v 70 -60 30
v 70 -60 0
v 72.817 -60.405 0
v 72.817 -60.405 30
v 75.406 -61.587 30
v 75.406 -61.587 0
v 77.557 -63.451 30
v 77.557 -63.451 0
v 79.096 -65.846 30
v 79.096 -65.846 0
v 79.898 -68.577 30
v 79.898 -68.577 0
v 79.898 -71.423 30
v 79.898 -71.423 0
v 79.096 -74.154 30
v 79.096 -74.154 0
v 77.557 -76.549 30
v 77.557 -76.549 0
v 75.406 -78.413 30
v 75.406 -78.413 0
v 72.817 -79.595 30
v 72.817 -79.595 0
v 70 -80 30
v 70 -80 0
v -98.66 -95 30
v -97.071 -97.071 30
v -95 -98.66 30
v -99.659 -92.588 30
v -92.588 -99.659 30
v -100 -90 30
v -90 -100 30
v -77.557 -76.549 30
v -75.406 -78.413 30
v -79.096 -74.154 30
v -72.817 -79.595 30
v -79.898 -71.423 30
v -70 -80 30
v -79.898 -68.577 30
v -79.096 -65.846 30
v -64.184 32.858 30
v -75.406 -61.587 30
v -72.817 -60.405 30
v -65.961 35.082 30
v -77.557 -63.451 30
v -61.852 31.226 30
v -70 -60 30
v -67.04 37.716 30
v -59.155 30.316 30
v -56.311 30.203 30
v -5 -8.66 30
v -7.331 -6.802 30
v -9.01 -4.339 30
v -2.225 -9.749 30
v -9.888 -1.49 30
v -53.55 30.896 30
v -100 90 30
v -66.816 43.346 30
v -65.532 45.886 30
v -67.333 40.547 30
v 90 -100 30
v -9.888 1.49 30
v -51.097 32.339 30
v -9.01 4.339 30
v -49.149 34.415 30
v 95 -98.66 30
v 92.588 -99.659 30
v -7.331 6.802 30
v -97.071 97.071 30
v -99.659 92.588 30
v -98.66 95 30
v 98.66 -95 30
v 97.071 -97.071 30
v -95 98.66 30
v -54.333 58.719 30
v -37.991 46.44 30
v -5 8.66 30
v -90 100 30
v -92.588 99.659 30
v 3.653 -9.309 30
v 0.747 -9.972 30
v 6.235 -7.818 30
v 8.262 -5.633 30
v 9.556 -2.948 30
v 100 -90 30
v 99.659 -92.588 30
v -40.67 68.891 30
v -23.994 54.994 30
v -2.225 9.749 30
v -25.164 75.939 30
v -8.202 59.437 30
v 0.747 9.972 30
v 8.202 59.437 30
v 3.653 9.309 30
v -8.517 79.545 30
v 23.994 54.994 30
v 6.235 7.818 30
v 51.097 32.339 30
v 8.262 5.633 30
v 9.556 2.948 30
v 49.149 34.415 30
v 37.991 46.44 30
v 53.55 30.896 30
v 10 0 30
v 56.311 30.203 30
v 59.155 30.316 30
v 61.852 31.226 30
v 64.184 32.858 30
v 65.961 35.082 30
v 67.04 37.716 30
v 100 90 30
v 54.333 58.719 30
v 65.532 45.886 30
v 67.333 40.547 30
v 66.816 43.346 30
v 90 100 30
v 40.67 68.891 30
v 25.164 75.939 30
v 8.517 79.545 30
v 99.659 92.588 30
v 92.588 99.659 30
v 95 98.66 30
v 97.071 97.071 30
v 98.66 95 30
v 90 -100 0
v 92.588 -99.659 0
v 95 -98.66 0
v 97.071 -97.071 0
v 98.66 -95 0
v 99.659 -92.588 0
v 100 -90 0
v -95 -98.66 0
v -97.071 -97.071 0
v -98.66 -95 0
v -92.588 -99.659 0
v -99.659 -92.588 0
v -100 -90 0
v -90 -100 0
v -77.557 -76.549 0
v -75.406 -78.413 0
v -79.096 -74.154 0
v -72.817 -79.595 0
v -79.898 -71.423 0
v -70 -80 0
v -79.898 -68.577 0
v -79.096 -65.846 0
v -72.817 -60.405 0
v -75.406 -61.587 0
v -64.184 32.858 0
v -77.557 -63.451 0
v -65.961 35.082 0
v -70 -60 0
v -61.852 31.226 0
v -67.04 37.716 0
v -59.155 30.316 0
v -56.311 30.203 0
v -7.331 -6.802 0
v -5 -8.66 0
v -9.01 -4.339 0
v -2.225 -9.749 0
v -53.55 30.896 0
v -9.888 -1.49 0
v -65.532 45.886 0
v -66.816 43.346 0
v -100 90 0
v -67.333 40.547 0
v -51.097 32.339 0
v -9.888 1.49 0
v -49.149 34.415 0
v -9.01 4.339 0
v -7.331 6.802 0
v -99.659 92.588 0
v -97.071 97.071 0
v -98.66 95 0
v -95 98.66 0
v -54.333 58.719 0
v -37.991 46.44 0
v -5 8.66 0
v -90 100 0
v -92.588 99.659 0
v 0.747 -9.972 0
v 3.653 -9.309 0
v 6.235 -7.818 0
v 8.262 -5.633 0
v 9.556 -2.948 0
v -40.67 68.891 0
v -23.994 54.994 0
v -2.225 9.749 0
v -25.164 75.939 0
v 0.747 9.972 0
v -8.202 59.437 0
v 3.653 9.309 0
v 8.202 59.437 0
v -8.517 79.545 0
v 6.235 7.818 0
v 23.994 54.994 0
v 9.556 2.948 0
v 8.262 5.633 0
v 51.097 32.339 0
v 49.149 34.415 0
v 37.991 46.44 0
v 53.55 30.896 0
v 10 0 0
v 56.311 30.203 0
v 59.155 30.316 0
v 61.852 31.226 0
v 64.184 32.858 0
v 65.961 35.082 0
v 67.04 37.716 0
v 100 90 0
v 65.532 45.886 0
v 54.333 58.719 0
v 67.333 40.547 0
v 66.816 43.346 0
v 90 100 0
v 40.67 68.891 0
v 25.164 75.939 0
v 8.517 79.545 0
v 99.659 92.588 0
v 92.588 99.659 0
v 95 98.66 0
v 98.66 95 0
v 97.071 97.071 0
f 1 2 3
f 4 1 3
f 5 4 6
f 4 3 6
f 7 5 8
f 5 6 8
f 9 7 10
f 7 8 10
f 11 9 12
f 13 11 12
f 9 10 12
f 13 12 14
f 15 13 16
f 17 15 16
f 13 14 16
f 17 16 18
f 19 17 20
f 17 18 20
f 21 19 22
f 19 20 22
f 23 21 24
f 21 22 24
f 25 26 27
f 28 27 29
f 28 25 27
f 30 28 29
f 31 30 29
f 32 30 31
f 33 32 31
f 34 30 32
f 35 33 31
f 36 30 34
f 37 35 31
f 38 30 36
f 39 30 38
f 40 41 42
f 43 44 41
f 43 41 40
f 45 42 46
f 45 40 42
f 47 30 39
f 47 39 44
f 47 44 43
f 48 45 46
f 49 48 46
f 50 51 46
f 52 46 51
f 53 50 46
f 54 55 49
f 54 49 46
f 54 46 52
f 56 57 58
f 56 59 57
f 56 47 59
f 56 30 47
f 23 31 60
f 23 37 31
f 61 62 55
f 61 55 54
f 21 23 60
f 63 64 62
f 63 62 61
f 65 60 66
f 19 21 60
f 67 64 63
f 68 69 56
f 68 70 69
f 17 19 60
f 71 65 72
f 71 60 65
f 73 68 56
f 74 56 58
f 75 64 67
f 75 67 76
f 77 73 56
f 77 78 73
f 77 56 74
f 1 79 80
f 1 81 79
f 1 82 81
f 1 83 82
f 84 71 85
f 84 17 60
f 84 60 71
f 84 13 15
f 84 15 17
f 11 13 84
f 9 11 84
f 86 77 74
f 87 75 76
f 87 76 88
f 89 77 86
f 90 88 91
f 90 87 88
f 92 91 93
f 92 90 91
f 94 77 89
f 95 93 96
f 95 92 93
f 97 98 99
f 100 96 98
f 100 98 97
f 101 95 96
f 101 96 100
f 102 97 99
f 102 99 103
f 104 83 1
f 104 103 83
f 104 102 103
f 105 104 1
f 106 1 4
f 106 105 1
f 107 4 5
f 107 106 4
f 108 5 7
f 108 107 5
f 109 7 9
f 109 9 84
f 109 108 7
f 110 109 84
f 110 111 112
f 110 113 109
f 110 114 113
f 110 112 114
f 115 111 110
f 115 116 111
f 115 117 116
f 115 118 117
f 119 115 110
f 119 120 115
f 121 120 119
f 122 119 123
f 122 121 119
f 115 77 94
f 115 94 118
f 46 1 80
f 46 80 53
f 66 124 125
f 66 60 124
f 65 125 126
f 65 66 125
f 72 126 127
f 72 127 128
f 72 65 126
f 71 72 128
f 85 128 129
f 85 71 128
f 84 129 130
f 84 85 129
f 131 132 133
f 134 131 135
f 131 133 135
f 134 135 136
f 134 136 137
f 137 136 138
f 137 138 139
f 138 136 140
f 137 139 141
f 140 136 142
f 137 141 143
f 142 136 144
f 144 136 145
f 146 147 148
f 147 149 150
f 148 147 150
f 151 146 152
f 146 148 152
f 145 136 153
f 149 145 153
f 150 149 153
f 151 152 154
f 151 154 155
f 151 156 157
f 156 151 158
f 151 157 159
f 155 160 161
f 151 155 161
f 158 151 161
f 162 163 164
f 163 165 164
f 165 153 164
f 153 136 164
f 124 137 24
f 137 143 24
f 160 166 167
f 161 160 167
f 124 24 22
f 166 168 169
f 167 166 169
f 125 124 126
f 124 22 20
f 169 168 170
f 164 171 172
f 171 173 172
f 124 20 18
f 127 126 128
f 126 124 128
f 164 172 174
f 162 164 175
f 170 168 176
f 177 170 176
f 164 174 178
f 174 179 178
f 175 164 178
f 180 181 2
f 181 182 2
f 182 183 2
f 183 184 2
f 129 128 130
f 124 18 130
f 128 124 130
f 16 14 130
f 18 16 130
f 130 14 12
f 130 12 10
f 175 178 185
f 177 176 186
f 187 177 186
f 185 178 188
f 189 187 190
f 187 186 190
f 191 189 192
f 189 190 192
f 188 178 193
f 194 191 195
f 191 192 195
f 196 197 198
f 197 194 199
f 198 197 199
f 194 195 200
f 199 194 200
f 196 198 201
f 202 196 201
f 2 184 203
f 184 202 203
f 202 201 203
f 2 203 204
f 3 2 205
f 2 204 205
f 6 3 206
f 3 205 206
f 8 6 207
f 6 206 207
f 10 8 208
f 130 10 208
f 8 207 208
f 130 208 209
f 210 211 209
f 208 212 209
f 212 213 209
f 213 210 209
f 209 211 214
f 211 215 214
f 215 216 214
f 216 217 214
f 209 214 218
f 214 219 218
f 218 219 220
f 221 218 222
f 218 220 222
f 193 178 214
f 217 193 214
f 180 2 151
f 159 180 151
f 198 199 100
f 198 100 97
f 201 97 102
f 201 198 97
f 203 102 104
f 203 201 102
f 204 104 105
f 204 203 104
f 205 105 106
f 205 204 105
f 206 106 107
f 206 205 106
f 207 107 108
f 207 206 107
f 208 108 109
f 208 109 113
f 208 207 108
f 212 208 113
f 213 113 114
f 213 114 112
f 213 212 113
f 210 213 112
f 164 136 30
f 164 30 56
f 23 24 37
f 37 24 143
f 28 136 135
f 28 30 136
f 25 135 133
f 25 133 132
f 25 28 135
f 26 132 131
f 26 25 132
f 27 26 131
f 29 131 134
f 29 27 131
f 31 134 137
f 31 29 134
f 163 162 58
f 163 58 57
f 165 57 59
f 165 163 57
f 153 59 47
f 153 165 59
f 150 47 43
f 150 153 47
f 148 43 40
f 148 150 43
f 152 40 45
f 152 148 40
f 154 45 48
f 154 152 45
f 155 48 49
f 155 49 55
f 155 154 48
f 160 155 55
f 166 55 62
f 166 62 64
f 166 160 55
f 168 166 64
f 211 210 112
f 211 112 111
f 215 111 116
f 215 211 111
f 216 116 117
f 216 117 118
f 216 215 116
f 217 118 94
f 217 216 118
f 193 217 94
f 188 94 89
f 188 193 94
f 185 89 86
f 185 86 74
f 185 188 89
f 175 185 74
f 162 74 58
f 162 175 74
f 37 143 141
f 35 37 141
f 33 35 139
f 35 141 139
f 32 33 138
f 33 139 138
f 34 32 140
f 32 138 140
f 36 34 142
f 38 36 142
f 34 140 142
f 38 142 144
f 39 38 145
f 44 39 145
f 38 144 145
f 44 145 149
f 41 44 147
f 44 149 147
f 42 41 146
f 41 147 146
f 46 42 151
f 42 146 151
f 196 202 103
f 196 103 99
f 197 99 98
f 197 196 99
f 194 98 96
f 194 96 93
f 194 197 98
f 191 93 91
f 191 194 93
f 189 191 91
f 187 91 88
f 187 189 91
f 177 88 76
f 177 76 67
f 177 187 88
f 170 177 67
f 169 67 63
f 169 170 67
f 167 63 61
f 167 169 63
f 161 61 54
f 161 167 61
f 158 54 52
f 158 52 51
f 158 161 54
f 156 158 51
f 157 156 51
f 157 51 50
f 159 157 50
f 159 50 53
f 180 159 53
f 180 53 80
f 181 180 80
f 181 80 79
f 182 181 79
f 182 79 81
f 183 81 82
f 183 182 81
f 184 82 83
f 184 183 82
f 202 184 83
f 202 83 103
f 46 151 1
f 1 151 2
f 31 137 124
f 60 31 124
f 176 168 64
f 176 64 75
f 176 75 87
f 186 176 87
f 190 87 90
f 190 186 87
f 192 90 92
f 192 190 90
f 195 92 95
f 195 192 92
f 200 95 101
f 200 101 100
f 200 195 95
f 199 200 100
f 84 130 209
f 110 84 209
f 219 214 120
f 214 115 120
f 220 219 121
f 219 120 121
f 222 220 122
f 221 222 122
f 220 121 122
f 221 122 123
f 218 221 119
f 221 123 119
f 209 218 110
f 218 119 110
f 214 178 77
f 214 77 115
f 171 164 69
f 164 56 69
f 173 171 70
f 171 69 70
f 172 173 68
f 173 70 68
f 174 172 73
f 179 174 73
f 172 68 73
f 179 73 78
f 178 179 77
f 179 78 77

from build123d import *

# Parameters (mm, degrees)
SKETCH1_W           = 200
SKETCH1_H           = 200
SKETCH1_R           = 10
BOSS_EXTRUDE1_DEPTH = 30
FILLET1_R           = 10


with BuildPart() as part:
    # Sketch1 → Boss-Extrude1 (new body)
    with BuildSketch(Plane.XY):
        Rectangle(SKETCH1_W, SKETCH1_H)
        Circle(SKETCH1_R, mode=Mode.SUBTRACT)
        with BuildLine():
            Line((70, -80), (-70, -80))
            ThreePointArc((-70, -80), (-80, -70), (-70, -60))
            Line((-70, -60), (70, -60))
            ThreePointArc((70, -60), (80, -70), (70, -80))
        make_face(mode=Mode.SUBTRACT)
        with BuildLine():
            ThreePointArc((65.532163543, 45.886114908), (0, 80), (-65.532163543, 45.886114908))
            ThreePointArc((-65.532163543, 45.886114908), (-63.076407464, 31.958830102), (-49.149122657, 34.414586181))
            ThreePointArc((-49.149122657, 34.414586181), (0, 60), (49.149122657, 34.414586181))
            ThreePointArc((49.149122657, 34.414586181), (63.076407464, 31.958830102), (65.532163543, 45.886114908))
        make_face(mode=Mode.SUBTRACT)
    extrude(amount=BOSS_EXTRUDE1_DEPTH)

    # Fillet1
    fillet1_edges = [part.edges().sort_by_distance(p)[0] for p in [
        (-100, 100, 15),
        (100, 100, 15),
        (100, -100, 15),
        (-100, -100, 15),
    ]]
    fillet(fillet1_edges, radius=FILLET1_R)


solid = part.part
